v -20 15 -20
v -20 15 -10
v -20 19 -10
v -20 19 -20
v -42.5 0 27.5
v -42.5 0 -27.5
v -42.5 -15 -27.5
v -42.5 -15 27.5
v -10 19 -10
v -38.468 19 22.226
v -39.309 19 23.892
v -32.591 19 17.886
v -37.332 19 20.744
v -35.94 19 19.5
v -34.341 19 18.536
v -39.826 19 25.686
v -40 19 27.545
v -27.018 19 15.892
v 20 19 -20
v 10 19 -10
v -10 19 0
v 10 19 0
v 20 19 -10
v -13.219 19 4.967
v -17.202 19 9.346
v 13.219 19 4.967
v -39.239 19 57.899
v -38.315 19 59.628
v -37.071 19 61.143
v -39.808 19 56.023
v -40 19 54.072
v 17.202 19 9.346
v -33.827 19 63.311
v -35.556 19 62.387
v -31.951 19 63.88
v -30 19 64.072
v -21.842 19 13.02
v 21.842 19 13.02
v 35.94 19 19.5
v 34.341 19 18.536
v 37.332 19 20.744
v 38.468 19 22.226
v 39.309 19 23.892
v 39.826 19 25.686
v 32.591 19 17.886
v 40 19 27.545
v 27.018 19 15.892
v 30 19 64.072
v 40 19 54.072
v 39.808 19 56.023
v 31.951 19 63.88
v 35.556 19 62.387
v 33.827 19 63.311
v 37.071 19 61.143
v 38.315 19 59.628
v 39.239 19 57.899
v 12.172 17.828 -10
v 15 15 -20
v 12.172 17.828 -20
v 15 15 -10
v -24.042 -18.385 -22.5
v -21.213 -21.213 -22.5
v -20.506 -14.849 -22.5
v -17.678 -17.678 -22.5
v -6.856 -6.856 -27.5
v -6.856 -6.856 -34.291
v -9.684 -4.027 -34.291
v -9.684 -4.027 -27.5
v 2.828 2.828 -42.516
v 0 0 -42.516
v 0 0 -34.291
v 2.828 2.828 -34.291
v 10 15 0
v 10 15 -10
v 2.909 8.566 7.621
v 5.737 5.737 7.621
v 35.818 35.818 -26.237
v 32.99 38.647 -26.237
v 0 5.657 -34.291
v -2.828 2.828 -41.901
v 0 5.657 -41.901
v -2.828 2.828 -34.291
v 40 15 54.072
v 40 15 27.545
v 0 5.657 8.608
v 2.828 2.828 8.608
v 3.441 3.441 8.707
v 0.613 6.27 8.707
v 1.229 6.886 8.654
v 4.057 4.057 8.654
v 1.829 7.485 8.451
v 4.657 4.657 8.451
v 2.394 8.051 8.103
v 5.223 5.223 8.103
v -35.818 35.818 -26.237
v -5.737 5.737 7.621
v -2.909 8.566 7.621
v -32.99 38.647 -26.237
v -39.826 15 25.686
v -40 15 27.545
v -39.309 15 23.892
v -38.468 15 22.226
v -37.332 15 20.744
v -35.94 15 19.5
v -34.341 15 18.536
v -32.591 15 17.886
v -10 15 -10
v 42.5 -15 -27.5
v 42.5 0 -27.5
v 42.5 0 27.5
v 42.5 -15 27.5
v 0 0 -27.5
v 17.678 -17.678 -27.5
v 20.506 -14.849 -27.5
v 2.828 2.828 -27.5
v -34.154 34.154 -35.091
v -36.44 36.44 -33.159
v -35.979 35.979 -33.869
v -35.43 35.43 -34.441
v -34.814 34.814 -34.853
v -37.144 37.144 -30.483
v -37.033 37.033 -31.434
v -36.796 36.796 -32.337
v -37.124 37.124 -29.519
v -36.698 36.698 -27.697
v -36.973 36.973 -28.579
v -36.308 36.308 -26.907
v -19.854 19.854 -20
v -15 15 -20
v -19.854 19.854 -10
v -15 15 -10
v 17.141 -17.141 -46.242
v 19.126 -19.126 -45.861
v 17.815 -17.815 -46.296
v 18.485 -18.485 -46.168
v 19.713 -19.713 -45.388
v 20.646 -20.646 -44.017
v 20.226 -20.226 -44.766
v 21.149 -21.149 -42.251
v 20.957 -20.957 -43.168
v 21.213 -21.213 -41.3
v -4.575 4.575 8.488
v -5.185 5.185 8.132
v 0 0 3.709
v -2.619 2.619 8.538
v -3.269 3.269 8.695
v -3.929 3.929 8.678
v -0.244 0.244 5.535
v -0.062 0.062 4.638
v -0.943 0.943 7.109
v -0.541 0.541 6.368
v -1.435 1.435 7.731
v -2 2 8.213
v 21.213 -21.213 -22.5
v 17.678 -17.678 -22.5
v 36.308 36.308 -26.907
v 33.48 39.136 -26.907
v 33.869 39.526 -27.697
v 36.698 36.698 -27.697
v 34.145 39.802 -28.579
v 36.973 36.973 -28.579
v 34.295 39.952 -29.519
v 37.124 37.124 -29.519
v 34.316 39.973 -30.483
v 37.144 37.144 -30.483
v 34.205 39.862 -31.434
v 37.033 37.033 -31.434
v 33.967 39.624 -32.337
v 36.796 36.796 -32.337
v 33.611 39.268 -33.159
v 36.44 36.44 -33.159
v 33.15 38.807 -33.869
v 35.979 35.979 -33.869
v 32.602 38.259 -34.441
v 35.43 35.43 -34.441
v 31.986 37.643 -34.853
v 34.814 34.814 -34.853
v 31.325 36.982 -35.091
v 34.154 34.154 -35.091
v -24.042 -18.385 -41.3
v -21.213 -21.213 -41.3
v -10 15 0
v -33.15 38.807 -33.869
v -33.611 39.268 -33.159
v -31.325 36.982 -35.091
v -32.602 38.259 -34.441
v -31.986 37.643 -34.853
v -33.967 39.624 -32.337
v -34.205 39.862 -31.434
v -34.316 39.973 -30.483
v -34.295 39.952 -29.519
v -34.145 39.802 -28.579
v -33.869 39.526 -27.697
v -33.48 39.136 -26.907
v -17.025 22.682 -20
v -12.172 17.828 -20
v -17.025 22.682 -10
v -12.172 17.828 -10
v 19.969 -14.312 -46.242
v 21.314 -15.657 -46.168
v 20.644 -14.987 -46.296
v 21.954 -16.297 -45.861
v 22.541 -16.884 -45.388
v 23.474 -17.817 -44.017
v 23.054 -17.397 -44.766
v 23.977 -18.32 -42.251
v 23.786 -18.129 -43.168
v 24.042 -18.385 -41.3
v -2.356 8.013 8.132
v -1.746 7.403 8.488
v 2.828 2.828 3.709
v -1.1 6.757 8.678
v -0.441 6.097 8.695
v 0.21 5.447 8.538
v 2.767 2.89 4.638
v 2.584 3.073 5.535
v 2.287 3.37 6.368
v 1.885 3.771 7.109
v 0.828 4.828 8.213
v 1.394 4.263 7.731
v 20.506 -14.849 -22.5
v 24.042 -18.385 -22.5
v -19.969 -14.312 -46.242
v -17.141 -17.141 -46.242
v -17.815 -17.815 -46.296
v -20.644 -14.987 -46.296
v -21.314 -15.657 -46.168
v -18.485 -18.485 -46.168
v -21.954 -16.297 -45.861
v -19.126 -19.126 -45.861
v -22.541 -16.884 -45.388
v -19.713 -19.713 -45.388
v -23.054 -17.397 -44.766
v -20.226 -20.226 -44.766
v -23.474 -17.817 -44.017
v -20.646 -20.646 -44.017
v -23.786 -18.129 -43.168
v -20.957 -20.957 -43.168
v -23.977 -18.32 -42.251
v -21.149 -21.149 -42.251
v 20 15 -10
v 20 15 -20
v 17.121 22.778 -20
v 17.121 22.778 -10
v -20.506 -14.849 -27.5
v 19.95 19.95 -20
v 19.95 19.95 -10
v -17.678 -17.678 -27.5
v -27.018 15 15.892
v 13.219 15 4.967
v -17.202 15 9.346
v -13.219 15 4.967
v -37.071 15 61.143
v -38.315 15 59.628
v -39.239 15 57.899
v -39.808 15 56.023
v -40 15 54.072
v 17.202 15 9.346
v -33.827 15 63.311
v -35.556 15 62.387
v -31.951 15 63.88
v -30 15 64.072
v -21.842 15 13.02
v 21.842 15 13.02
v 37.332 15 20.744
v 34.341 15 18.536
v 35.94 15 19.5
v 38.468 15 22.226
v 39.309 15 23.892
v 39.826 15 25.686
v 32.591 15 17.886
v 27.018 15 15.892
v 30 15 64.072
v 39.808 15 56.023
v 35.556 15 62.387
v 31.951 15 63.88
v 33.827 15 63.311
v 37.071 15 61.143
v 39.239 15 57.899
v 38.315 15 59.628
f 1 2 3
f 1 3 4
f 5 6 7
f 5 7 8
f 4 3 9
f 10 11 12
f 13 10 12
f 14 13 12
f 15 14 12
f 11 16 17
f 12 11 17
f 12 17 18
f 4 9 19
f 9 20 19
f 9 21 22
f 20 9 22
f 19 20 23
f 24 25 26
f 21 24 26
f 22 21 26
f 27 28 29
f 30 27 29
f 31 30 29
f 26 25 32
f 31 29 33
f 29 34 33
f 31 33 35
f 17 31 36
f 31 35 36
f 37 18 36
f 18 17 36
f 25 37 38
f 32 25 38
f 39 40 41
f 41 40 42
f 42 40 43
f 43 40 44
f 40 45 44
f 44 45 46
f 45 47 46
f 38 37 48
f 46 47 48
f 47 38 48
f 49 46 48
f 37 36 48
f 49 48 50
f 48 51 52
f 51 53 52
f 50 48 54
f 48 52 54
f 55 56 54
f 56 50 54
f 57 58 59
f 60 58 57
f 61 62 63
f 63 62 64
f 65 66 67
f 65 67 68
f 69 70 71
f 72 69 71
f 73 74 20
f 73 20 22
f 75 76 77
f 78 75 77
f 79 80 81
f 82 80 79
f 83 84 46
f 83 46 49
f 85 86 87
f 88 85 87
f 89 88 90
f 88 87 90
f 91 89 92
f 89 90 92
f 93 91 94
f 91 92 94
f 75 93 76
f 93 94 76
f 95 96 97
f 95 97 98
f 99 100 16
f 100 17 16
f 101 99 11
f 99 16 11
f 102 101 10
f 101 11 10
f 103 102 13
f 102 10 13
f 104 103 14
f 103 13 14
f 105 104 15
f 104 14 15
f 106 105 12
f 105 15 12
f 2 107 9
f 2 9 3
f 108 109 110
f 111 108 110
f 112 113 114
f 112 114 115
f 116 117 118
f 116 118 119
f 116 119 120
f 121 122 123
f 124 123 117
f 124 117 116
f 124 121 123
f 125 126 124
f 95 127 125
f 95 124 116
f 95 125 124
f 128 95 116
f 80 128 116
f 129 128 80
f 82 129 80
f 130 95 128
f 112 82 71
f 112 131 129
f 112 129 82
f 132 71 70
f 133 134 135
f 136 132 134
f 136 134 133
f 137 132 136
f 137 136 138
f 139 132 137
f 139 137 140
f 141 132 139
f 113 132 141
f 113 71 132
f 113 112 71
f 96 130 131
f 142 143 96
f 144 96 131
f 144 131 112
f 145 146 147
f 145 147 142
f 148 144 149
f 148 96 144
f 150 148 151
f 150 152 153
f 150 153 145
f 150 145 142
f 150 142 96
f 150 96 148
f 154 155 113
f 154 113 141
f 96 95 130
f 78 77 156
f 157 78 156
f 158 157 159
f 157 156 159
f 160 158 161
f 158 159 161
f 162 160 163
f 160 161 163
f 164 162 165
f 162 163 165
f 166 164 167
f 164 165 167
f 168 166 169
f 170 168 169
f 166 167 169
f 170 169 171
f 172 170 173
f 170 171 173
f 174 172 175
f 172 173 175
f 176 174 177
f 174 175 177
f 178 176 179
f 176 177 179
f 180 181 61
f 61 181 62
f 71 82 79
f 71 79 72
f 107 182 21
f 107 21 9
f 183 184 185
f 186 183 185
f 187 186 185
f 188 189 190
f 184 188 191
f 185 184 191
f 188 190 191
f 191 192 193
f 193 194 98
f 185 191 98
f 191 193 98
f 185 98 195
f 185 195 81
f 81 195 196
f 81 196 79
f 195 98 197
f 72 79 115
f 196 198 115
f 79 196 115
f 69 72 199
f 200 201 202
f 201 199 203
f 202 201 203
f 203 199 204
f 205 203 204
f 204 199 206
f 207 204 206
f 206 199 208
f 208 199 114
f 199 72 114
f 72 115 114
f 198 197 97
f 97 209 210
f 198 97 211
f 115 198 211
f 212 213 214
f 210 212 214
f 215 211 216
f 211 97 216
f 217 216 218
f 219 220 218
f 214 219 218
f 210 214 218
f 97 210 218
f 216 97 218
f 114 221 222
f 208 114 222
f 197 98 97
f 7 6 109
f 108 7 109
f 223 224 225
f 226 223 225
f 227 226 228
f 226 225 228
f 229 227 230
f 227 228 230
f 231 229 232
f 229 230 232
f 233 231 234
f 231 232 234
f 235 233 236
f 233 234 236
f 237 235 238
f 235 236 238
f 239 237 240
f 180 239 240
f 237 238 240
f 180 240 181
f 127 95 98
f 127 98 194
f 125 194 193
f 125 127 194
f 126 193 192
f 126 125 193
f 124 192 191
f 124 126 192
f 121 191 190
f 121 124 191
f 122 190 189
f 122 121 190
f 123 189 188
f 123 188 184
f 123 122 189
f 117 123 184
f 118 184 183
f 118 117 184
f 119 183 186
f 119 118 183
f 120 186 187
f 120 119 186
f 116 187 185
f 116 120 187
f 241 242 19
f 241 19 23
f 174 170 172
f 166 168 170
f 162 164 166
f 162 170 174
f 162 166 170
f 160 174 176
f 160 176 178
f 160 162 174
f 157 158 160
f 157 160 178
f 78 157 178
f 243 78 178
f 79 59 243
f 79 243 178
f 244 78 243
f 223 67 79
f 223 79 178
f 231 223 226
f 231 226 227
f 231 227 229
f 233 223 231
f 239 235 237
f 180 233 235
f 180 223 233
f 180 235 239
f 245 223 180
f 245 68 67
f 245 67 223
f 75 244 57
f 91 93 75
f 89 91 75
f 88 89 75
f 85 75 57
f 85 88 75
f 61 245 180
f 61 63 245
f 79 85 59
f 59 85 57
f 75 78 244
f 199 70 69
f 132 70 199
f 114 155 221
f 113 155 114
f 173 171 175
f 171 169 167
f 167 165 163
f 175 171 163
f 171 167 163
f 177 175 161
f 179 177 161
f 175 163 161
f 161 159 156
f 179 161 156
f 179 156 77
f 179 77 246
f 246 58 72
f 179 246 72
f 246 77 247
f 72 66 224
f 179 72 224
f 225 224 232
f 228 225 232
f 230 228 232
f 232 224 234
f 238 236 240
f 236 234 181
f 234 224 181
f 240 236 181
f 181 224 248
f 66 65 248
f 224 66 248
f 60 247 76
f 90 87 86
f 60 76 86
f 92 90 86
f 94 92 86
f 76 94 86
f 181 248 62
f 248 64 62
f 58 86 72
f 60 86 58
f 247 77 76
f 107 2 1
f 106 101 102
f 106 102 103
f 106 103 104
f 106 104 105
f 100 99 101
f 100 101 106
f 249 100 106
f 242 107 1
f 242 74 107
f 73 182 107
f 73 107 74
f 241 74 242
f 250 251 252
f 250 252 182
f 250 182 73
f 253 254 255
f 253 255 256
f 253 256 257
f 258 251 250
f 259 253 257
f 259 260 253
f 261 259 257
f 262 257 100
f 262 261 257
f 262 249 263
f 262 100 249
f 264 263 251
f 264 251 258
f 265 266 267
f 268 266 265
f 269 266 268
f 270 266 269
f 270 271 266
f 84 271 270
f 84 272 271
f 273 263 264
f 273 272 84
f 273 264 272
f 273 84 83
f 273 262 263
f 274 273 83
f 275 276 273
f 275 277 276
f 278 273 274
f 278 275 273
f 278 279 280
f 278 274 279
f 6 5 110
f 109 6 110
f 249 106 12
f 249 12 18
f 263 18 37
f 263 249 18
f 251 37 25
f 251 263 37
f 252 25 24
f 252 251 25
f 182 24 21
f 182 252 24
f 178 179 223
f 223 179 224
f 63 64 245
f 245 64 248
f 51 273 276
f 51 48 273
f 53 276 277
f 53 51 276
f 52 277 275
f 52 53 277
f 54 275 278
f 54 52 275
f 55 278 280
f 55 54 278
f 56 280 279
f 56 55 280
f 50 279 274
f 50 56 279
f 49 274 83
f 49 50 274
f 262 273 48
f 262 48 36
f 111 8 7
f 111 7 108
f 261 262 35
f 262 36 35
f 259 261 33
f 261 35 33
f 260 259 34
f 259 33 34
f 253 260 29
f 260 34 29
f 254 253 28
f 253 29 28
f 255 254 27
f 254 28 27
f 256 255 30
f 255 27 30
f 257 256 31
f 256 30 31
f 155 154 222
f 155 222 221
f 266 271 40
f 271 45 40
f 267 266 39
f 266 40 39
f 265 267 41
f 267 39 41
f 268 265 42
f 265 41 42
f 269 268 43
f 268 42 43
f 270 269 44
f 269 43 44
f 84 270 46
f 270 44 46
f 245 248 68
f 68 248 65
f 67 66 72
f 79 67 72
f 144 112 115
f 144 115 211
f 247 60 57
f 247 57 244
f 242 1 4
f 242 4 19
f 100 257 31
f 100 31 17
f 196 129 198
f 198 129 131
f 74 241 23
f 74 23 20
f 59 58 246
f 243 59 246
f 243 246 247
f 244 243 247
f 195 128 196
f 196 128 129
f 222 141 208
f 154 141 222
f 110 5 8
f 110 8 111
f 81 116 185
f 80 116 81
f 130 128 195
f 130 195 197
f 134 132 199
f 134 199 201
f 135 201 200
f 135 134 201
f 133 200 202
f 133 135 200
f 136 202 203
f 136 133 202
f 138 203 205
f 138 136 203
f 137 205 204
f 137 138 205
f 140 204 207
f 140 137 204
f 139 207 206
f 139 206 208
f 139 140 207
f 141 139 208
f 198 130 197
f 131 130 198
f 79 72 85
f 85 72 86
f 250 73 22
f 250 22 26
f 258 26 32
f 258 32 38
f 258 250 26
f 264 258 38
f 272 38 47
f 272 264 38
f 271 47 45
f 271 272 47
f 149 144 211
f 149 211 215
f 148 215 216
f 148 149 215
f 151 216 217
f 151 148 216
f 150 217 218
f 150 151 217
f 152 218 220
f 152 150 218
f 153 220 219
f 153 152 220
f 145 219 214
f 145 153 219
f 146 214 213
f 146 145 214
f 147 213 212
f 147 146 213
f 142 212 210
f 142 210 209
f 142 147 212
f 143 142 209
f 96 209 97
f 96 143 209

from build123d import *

# Parameters (mm, degrees)
F0_W      = 85
F0_H      = 55
F1_DEPTH  = 15
F5_DEPTH  = 4
F7_W      = 13.6952600442
F7_H      = 45
F8_DEPTH  = 25
F9_W      = 4
F9_H      = 1.4558660838
F10_DEPTH = 25
F11_W     = 4
F11_H     = 12.2237176445
F12_DEPTH = 4
F15_DEPTH = 4
F16_W     = 6.8639610307
F16_H     = 10
F17_DEPTH = 25
F18_W     = 7
F18_H     = 10
F19_DEPTH = 25
F20_R     = 10


with BuildPart() as f1:
    # F0 (on Front) → F1 (new body)
    with BuildSketch(Plane.XZ):
        Rectangle(F0_W, F0_H)
    extrude(amount=F1_DEPTH)

    # F9 (on face) → F10 (cut)
    with BuildSketch(Plane(origin=(2.8284271247, 2.8284271247, 0), x_dir=(-0.7071067812, 0.7071067812, 0), z_dir=(0.7071067812, 0.7071067812, 0))):
        with Locations((2, -49.5630876647)):
            Rectangle(F9_W, F9_H)
    extrude(amount=-F10_DEPTH, mode=Mode.SUBTRACT)


with BuildPart() as f5:
    # F4 (on line) → F5 (new body)
    with BuildSketch(Plane(origin=(0, 0, 0), x_dir=(-0.7071067812, -0.7071067812, 0), z_dir=(-0.7071067812, 0.7071067812, 0))):
        with BuildLine():
            Line((25, -27.5), (0, -27.5))
            Line((0, -27.5), (0, 3.7089792934))
            ThreePointArc((0, 3.7089792934), (-2.8284017695, 8.2127733746), (-8.1136644502, 7.6211517963))
            Line((-8.1136644502, 7.6211517963), (-50.6545456419, -26.236769691))
            ThreePointArc((-50.6545456419, -26.236769691), (-52.3730201924, -31.4336338606), (-48.3005526751, -35.0908951718))
            Line((-48.3005526751, -35.0908951718), (24.2403285166, -46.2417982796))
            ThreePointArc((24.2403285166, -46.2417982796), (28.2558902456, -45.0944702776), (30, -41.2998453016))
            Line((30, -41.2998453016), (30, -22.5))
            Line((30, -22.5), (25, -22.5))
            Line((25, -22.5), (25, -27.5))
        make_face()
    extrude(amount=F5_DEPTH)


with BuildPart() as f6_1:
    # F6: instance of F5
    add(f5.part.mirror(Plane.YZ))

    # F11 (on face) → F12 (cut)
    with BuildSketch(Plane(origin=(0, 0, 0), x_dir=(0.7071067812, -0.7071067812, 0), z_dir=(-0.7071067812, -0.7071067812, 0))):
        with Locations((-2, -40.4028795288)):
            Rectangle(F11_W, F11_H)
    extrude(amount=-F12_DEPTH, mode=Mode.SUBTRACT)

    # F16 (on face) → F17 (cut)
    with BuildSketch(Plane(origin=(0, 0, 0), x_dir=(0.7071067812, -0.7071067812, 0), z_dir=(-0.7071067812, -0.7071067812, 0))):
        with Locations((-24.6451839509, -15)):
            Rectangle(F16_W, F16_H)
    extrude(amount=-F17_DEPTH, mode=Mode.SUBTRACT)


with BuildPart() as f5_1:
    add(f5.part)

    # F7 (on face) → F8 (cut)
    with BuildSketch(Plane(origin=(0, 0, 0), x_dir=(0.7071067812, 0.7071067812, 0), z_dir=(0.7071067812, -0.7071067812, 0))):
        with Locations((-2.8476300221, -11.7910207066)):
            Rectangle(F7_W, F7_H)
    extrude(amount=-F8_DEPTH, mode=Mode.SUBTRACT)

    # F18 (on face) → F19 (cut)
    with BuildSketch(Plane(origin=(0, 0, 0), x_dir=(0.7071067812, 0.7071067812, 0), z_dir=(0.7071067812, -0.7071067812, 0))):
        with Locations((24.7132034356, -15)):
            Rectangle(F18_W, F18_H)
    extrude(amount=-F19_DEPTH, mode=Mode.SUBTRACT)


with BuildPart() as f15:
    # F14 (on offset) → F15 (new body)
    with BuildSketch(Plane.XZ.offset(-15)):
        with BuildLine():
            Line((40, 64.0720436681), (-40, 64.0720436681))
            Line((-40, 64.0720436681), (-40, 19.0720436681))
            ThreePointArc((-40, 19.0720436681), (-22.509087408, 13.4541849351), (-10, 0))
            Line((-10, 0), (-10, -10))
            Line((-10, -10), (-20, -10))
            Line((-20, -10), (-20, -20))
            Line((-20, -20), (-10, -20))
            Line((-10, -20), (10, -20))
            Line((10, -20), (20, -20))
            Line((20, -20), (20, -10))
            Line((20, -10), (10, -10))
            Line((10, -10), (10, 0))
            ThreePointArc((10, 0), (22.509087408, 13.4541849351), (40, 19.0720436681))
            Line((40, 19.0720436681), (40, 64.0720436681))
        make_face()
    extrude(amount=-F15_DEPTH)

    # F20
    f20_edges = [f15.edges().sort_by_distance(p)[0] for p in [
        (40, 17, 64.072044),
        (40, 17, 19.072044),
        (-40, 17, 64.072044),
        (-40, 17, 19.072044),
    ]]
    fillet(f20_edges, radius=F20_R)


solid = Compound([f1.part, f6_1.part, f5_1.part, f15.part])
